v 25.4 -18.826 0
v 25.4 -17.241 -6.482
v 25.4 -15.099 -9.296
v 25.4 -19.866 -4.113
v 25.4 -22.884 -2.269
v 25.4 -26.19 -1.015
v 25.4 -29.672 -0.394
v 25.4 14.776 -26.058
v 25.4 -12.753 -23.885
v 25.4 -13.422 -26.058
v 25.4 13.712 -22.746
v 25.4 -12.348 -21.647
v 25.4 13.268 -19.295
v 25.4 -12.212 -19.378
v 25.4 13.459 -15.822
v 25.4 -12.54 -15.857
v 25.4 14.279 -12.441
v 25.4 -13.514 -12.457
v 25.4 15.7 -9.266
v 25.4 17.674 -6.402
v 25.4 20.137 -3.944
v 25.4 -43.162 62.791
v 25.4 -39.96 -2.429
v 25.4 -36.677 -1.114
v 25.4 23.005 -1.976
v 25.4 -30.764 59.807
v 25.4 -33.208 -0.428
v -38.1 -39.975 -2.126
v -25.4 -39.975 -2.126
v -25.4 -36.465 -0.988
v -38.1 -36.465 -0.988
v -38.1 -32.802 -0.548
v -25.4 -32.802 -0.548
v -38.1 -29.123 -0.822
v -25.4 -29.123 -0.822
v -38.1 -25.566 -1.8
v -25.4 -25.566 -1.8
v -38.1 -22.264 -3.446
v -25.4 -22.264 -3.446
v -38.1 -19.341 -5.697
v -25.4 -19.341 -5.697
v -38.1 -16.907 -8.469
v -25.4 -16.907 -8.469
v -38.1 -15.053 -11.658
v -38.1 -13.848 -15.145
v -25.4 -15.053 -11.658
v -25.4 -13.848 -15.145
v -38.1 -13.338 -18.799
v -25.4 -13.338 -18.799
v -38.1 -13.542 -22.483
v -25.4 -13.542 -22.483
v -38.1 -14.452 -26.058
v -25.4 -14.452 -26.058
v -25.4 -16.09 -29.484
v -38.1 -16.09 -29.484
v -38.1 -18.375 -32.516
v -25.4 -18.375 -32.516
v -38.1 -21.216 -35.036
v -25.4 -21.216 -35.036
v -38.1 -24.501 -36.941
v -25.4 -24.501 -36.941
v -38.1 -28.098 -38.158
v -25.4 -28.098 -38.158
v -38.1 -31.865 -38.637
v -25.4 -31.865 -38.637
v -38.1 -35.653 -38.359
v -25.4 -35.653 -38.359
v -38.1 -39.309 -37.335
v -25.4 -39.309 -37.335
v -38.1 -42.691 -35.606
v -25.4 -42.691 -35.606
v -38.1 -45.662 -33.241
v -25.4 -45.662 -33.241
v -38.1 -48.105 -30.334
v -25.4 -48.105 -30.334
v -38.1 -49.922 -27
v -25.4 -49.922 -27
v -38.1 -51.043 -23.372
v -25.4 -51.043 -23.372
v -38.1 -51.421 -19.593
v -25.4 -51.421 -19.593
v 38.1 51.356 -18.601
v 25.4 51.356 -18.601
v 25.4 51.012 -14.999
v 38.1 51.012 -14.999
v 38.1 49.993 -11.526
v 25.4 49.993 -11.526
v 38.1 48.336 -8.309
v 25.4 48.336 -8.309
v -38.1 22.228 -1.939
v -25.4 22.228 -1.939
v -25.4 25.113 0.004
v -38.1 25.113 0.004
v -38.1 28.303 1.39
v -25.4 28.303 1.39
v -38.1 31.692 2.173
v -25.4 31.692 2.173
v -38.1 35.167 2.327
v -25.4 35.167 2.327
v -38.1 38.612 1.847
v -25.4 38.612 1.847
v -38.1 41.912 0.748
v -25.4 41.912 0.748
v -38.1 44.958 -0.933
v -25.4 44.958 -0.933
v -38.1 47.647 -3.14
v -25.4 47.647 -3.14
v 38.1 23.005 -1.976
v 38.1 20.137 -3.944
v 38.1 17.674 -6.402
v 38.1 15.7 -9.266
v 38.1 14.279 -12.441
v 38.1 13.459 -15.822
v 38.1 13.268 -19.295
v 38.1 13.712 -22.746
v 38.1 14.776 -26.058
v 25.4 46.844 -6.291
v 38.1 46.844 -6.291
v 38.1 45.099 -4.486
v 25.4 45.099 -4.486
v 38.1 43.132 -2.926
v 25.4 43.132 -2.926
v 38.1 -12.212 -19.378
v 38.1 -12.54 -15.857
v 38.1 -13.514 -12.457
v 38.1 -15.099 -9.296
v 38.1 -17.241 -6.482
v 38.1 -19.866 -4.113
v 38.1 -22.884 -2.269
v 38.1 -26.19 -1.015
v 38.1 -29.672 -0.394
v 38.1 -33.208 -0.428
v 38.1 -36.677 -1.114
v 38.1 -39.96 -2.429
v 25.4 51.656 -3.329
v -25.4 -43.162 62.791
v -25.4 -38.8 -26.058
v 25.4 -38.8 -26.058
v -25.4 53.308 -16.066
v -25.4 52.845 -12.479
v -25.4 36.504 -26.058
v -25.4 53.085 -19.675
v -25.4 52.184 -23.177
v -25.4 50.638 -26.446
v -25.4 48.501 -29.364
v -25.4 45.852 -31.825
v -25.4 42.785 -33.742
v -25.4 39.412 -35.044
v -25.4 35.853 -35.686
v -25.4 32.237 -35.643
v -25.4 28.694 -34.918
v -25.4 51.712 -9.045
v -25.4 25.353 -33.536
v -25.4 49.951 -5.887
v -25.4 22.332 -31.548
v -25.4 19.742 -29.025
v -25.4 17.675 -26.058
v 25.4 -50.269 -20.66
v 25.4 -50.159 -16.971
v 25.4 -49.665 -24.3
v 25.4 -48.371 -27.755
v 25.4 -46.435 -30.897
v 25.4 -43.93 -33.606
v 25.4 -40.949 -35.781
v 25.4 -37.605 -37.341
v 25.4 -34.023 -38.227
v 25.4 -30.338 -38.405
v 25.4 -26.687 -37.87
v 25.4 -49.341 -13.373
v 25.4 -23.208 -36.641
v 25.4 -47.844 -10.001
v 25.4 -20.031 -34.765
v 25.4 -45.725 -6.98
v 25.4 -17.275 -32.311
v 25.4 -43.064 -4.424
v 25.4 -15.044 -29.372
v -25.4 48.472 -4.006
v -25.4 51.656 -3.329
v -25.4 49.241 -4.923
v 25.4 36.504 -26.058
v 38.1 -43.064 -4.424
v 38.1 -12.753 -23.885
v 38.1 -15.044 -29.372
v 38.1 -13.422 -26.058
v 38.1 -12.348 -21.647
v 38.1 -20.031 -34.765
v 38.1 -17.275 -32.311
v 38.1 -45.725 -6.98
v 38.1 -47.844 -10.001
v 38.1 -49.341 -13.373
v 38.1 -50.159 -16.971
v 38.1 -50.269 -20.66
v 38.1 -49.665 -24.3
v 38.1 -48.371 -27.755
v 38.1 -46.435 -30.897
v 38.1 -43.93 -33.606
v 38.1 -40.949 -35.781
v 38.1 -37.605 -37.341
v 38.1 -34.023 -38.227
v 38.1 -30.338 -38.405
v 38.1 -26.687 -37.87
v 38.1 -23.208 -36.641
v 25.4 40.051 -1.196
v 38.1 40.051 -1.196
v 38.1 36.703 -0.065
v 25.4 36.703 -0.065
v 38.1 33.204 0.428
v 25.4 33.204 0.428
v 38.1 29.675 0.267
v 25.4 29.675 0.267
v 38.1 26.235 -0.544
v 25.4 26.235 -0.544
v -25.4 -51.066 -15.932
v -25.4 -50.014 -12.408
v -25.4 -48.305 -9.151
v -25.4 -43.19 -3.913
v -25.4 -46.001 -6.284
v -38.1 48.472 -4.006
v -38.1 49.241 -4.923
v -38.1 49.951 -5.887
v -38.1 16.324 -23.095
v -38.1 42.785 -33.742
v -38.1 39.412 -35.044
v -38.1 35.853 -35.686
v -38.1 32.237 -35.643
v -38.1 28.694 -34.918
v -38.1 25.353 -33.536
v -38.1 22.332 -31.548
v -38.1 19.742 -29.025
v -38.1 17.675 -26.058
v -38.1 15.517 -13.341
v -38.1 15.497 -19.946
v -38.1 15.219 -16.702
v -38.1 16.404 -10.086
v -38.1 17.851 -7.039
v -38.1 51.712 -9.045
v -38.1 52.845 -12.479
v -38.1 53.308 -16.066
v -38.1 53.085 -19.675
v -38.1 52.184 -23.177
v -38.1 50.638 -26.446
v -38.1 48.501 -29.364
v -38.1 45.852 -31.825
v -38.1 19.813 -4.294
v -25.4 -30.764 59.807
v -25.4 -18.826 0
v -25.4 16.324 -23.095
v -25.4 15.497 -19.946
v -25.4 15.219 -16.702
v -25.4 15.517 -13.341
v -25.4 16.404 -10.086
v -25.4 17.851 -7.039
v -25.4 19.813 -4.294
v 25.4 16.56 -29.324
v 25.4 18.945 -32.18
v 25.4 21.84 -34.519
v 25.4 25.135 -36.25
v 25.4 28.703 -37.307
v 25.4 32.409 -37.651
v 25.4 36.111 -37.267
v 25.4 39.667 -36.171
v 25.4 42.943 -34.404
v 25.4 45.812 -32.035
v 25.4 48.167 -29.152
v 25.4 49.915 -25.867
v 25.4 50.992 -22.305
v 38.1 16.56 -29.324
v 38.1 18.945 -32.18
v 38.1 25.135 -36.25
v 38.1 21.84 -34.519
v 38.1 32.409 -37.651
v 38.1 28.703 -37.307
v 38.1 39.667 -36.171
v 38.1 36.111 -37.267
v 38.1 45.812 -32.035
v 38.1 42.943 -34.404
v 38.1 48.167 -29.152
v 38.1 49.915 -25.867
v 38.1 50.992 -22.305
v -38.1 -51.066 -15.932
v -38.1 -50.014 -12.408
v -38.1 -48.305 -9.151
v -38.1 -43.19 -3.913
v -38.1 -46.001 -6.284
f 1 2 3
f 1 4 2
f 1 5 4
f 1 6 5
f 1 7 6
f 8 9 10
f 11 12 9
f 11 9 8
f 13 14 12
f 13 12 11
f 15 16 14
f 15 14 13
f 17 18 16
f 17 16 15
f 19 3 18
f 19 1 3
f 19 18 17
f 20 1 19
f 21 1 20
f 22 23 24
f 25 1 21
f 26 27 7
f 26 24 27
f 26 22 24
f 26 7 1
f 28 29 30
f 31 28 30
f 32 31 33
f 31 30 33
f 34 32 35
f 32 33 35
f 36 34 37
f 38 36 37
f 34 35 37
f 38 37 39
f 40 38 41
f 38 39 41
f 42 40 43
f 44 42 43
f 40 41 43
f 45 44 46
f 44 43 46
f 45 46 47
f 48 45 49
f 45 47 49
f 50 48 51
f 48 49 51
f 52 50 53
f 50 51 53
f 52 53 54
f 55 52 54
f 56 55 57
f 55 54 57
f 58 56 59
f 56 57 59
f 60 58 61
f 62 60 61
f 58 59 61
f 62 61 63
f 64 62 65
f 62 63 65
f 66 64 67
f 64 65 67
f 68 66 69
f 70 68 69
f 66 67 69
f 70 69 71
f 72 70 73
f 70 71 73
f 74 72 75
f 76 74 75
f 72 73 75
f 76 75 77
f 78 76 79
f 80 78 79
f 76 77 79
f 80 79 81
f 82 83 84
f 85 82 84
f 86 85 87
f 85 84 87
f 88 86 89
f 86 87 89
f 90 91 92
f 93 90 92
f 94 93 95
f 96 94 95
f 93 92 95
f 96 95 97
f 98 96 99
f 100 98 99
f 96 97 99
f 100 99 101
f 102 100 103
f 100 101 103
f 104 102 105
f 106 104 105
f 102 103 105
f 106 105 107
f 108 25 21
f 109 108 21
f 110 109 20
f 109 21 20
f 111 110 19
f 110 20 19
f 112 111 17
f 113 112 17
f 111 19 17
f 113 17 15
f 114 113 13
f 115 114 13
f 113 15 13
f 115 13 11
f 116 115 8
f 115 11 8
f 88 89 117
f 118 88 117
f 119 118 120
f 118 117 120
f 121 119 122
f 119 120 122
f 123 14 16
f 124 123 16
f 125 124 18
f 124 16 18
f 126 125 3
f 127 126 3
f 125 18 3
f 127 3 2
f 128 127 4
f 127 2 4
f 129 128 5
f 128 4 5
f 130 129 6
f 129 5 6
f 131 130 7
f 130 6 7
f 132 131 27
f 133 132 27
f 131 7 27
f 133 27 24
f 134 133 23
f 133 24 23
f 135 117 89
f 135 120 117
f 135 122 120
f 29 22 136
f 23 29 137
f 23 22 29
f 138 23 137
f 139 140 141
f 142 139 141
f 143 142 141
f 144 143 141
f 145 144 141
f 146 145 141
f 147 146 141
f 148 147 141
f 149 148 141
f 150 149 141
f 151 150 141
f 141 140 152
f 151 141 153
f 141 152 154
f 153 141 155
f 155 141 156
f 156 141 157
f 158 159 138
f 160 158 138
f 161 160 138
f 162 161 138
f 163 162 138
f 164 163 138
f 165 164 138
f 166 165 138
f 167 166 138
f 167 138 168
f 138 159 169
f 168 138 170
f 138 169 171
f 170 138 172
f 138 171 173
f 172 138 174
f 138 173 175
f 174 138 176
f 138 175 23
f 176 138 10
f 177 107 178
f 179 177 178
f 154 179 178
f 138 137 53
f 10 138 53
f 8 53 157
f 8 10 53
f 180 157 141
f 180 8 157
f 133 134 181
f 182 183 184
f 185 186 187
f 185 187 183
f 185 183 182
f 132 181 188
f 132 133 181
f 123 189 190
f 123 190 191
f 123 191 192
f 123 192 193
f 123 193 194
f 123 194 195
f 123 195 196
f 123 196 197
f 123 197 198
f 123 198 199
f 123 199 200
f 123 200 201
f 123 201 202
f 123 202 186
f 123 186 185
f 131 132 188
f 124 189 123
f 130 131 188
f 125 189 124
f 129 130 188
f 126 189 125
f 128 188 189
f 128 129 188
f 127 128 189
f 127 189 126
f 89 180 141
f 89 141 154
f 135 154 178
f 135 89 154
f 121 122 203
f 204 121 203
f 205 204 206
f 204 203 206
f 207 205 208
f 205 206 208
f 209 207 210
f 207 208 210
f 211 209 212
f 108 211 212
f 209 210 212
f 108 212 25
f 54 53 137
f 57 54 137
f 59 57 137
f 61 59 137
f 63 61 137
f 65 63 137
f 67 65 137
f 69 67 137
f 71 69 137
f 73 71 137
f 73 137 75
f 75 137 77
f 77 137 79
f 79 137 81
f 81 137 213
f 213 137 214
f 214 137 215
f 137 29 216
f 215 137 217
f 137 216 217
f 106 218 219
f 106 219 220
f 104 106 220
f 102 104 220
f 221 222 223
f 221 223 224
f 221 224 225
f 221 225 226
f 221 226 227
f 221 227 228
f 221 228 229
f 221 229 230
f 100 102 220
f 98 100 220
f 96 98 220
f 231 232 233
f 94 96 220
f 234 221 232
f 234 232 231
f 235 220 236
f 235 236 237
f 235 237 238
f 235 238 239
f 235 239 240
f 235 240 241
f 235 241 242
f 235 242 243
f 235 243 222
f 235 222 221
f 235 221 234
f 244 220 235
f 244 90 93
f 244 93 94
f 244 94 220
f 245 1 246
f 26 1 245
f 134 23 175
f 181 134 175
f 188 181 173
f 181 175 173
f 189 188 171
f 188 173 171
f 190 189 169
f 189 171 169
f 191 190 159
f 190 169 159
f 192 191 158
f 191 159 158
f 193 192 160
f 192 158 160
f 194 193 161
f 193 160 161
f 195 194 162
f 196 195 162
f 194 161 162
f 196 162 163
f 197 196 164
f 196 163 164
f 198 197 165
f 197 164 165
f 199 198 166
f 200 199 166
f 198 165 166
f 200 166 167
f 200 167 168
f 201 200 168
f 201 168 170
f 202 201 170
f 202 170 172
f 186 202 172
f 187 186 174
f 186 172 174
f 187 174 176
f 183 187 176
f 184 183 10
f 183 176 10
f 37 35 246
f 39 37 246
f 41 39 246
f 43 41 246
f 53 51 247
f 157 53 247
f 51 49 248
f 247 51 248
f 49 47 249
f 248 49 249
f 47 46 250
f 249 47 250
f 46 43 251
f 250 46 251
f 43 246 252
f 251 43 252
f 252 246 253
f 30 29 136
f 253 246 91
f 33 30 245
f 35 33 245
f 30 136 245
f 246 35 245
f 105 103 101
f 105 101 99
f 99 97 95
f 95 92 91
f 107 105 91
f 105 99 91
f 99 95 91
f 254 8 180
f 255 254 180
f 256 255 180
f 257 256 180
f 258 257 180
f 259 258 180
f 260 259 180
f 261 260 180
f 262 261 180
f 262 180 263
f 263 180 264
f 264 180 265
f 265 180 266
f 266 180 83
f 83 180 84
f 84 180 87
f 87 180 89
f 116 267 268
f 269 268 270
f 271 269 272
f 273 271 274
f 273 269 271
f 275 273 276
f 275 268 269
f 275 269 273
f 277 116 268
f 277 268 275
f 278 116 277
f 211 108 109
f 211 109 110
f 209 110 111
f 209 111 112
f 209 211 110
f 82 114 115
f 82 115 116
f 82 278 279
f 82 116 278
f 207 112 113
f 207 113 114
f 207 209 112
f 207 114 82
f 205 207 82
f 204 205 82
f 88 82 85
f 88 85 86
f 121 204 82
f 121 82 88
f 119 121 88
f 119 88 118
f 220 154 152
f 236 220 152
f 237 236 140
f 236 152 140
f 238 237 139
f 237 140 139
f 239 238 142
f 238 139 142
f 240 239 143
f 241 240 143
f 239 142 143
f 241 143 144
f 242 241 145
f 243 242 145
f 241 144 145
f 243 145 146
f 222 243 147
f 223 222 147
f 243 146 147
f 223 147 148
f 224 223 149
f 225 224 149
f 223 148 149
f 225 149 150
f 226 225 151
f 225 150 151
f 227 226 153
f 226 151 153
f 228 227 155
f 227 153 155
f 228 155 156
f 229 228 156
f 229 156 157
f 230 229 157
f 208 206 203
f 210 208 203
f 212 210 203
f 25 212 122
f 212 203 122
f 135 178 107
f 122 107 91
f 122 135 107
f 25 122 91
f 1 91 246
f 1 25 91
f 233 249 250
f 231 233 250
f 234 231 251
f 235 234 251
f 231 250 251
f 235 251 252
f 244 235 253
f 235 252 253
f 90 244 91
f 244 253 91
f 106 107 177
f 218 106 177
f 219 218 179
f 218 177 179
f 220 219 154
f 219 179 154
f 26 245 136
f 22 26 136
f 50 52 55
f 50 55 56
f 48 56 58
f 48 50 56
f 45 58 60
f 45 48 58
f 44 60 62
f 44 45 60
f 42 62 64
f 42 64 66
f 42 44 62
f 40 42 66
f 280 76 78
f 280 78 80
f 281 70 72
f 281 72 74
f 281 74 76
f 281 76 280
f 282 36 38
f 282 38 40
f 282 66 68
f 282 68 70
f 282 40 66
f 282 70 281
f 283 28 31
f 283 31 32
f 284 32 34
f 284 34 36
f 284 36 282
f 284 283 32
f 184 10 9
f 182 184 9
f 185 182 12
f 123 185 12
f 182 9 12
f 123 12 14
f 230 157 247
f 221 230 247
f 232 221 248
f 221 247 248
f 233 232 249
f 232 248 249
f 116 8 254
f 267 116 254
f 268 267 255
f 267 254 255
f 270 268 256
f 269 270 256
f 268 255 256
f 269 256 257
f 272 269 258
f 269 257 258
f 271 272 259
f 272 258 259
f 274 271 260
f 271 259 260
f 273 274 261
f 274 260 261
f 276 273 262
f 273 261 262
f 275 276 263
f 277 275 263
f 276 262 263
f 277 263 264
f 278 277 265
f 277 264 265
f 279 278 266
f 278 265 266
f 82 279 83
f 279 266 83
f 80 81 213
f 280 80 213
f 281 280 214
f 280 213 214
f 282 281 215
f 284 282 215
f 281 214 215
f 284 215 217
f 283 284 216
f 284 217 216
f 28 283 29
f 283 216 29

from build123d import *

# Parameters (mm, degrees)
F1_DEPTH = 25.4
F3_DEPTH = 12.7
F5_DEPTH = 12.7


with BuildPart() as f1:
    # F0 (on Right) → F1 (new body, symmetric)
    with BuildSketch(Plane.YZ):
        Polygon((-30.7642482221, 59.8066113889), (-43.1617796421, 62.7912059426), (-38.7996844947, -26.0577760637), (36.5038476884, -26.0577760637), (51.6563877463, -3.328967141), (-18.8258830458, 0), align=None)
    extrude(amount=F1_DEPTH, both=True)

    # F2 (on face) → F3 (join)
    with BuildSketch(Plane.YZ.offset(25.4)):
        with BuildLine():
            Line((-38.7996844947, -26.0577760637), (-39.9597344248, -2.4293929413))
            ThreePointArc((-39.9597344248, -2.4293929413), (-43.9297710113, -33.6056919757), (-13.4215462618, -26.0577760637))
            Line((-13.4215462618, -26.0577760637), (-38.7996844947, -26.0577760637))
        make_face()
        with BuildLine():
            ThreePointArc((23.0047428651, -1.9757135742), (14.2789928232, -12.4410495521), (14.7757120925, -26.0577760637))
            Line((14.7757120925, -26.0577760637), (36.5038476884, -26.0577760637))
            Line((36.5038476884, -26.0577760637), (48.3362770566, -8.3091329206))
            ThreePointArc((48.3362770566, -8.3091329206), (46.0012077103, -5.3595465788), (43.1320322619, -2.9263510081))
            Line((43.1320322619, -2.9263510081), (23.0047428651, -1.9757135742))
        make_face()
        with BuildLine():
            Line((36.5038476884, -26.0577760637), (14.7757120925, -26.0577760637))
            ThreePointArc((14.7757120925, -26.0577760637), (36.1107346383, -37.2669929283), (51.3556094348, -18.6008866876))
            ThreePointArc((51.3556094348, -18.6008866876), (50.585198027, -13.2381317144), (48.3362770566, -8.3091329206))
            Line((48.3362770566, -8.3091329206), (36.5038476884, -26.0577760637))
        make_face()
        with BuildLine():
            ThreePointArc((43.1320322619, -2.9263510081), (33.2043632144, 0.427900495), (23.0047428651, -1.9757135742))
            Line((23.0047428651, -1.9757135742), (43.1320322619, -2.9263510081))
        make_face()
        with BuildLine():
            ThreePointArc((-13.4215462618, -26.0577760637), (-12.5168247449, -22.7721507415), (-12.2119991601, -19.3779002875))
            ThreePointArc((-12.2119991601, -19.3779002875), (-21.3319779313, -3.1206810174), (-39.9597344248, -2.4293929413))
            Line((-39.9597344248, -2.4293929413), (-38.7996844947, -26.0577760637))
            Line((-38.7996844947, -26.0577760637), (-13.4215462618, -26.0577760637))
        make_face()
    extrude(amount=F3_DEPTH)

    # F4 (on face) → F5 (join)
    with BuildSketch(Plane(origin=(-25.4, 0, 0), x_dir=(0, -1, 0), z_dir=(-1, 0, 0))):
        with BuildLine():
            ThreePointArc((-49.9511753023, -5.886785676), (-44.364371435, -32.8563377087), (-17.6745105539, -26.0577760637))
            Line((-17.6745105539, -26.0577760637), (-36.5038476884, -26.0577760637))
            Line((-36.5038476884, -26.0577760637), (-49.9511753023, -5.886785676))
        make_face()
        with BuildLine():
            ThreePointArc((-17.6745105539, -26.0577760637), (-15.8427926815, -21.5381365786), (-15.2185845072, -16.7015369886))
            ThreePointArc((-15.2185845072, -16.7015369886), (-17.0599821691, -8.5304596075), (-22.2281913909, -1.9390360621))
            Line((-22.2281913909, -1.9390360621), (-47.6467773495, -3.1395881509))
            ThreePointArc((-47.6467773495, -3.1395881509), (-48.8637569956, -4.4588477401), (-49.9511753023, -5.886785676))
            Line((-49.9511753023, -5.886785676), (-36.5038476884, -26.0577760637))
            Line((-36.5038476884, -26.0577760637), (-17.6745105539, -26.0577760637))
        make_face()
        with BuildLine():
            Line((-47.6467773495, -3.1395881509), (-22.2281913909, -1.9390360621))
            ThreePointArc((-22.2281913909, -1.9390360621), (-35.1673382867, 2.3272501941), (-47.6467773495, -3.1395881509))
        make_face()
        with BuildLine():
            ThreePointArc((39.9746132614, -2.1263345619), (19.3411728577, -5.6965682778), (14.4517302333, -26.0577760637))
            Line((14.4517302333, -26.0577760637), (38.7996844947, -26.0577760637))
            Line((38.7996844947, -26.0577760637), (39.9746132614, -2.1263345619))
        make_face()
        with BuildLine():
            Line((38.7996844947, -26.0577760637), (14.4517302333, -26.0577760637))
            ThreePointArc((14.4517302333, -26.0577760637), (35.6526480592, -38.358509601), (51.4213347316, -19.5932362791))
            ThreePointArc((51.4213347316, -19.5932362791), (48.3047109587, -9.151492076), (39.9746132614, -2.1263345619))
            Line((39.9746132614, -2.1263345619), (38.7996844947, -26.0577760637))
        make_face()
    extrude(amount=F5_DEPTH)


solid = f1.part
